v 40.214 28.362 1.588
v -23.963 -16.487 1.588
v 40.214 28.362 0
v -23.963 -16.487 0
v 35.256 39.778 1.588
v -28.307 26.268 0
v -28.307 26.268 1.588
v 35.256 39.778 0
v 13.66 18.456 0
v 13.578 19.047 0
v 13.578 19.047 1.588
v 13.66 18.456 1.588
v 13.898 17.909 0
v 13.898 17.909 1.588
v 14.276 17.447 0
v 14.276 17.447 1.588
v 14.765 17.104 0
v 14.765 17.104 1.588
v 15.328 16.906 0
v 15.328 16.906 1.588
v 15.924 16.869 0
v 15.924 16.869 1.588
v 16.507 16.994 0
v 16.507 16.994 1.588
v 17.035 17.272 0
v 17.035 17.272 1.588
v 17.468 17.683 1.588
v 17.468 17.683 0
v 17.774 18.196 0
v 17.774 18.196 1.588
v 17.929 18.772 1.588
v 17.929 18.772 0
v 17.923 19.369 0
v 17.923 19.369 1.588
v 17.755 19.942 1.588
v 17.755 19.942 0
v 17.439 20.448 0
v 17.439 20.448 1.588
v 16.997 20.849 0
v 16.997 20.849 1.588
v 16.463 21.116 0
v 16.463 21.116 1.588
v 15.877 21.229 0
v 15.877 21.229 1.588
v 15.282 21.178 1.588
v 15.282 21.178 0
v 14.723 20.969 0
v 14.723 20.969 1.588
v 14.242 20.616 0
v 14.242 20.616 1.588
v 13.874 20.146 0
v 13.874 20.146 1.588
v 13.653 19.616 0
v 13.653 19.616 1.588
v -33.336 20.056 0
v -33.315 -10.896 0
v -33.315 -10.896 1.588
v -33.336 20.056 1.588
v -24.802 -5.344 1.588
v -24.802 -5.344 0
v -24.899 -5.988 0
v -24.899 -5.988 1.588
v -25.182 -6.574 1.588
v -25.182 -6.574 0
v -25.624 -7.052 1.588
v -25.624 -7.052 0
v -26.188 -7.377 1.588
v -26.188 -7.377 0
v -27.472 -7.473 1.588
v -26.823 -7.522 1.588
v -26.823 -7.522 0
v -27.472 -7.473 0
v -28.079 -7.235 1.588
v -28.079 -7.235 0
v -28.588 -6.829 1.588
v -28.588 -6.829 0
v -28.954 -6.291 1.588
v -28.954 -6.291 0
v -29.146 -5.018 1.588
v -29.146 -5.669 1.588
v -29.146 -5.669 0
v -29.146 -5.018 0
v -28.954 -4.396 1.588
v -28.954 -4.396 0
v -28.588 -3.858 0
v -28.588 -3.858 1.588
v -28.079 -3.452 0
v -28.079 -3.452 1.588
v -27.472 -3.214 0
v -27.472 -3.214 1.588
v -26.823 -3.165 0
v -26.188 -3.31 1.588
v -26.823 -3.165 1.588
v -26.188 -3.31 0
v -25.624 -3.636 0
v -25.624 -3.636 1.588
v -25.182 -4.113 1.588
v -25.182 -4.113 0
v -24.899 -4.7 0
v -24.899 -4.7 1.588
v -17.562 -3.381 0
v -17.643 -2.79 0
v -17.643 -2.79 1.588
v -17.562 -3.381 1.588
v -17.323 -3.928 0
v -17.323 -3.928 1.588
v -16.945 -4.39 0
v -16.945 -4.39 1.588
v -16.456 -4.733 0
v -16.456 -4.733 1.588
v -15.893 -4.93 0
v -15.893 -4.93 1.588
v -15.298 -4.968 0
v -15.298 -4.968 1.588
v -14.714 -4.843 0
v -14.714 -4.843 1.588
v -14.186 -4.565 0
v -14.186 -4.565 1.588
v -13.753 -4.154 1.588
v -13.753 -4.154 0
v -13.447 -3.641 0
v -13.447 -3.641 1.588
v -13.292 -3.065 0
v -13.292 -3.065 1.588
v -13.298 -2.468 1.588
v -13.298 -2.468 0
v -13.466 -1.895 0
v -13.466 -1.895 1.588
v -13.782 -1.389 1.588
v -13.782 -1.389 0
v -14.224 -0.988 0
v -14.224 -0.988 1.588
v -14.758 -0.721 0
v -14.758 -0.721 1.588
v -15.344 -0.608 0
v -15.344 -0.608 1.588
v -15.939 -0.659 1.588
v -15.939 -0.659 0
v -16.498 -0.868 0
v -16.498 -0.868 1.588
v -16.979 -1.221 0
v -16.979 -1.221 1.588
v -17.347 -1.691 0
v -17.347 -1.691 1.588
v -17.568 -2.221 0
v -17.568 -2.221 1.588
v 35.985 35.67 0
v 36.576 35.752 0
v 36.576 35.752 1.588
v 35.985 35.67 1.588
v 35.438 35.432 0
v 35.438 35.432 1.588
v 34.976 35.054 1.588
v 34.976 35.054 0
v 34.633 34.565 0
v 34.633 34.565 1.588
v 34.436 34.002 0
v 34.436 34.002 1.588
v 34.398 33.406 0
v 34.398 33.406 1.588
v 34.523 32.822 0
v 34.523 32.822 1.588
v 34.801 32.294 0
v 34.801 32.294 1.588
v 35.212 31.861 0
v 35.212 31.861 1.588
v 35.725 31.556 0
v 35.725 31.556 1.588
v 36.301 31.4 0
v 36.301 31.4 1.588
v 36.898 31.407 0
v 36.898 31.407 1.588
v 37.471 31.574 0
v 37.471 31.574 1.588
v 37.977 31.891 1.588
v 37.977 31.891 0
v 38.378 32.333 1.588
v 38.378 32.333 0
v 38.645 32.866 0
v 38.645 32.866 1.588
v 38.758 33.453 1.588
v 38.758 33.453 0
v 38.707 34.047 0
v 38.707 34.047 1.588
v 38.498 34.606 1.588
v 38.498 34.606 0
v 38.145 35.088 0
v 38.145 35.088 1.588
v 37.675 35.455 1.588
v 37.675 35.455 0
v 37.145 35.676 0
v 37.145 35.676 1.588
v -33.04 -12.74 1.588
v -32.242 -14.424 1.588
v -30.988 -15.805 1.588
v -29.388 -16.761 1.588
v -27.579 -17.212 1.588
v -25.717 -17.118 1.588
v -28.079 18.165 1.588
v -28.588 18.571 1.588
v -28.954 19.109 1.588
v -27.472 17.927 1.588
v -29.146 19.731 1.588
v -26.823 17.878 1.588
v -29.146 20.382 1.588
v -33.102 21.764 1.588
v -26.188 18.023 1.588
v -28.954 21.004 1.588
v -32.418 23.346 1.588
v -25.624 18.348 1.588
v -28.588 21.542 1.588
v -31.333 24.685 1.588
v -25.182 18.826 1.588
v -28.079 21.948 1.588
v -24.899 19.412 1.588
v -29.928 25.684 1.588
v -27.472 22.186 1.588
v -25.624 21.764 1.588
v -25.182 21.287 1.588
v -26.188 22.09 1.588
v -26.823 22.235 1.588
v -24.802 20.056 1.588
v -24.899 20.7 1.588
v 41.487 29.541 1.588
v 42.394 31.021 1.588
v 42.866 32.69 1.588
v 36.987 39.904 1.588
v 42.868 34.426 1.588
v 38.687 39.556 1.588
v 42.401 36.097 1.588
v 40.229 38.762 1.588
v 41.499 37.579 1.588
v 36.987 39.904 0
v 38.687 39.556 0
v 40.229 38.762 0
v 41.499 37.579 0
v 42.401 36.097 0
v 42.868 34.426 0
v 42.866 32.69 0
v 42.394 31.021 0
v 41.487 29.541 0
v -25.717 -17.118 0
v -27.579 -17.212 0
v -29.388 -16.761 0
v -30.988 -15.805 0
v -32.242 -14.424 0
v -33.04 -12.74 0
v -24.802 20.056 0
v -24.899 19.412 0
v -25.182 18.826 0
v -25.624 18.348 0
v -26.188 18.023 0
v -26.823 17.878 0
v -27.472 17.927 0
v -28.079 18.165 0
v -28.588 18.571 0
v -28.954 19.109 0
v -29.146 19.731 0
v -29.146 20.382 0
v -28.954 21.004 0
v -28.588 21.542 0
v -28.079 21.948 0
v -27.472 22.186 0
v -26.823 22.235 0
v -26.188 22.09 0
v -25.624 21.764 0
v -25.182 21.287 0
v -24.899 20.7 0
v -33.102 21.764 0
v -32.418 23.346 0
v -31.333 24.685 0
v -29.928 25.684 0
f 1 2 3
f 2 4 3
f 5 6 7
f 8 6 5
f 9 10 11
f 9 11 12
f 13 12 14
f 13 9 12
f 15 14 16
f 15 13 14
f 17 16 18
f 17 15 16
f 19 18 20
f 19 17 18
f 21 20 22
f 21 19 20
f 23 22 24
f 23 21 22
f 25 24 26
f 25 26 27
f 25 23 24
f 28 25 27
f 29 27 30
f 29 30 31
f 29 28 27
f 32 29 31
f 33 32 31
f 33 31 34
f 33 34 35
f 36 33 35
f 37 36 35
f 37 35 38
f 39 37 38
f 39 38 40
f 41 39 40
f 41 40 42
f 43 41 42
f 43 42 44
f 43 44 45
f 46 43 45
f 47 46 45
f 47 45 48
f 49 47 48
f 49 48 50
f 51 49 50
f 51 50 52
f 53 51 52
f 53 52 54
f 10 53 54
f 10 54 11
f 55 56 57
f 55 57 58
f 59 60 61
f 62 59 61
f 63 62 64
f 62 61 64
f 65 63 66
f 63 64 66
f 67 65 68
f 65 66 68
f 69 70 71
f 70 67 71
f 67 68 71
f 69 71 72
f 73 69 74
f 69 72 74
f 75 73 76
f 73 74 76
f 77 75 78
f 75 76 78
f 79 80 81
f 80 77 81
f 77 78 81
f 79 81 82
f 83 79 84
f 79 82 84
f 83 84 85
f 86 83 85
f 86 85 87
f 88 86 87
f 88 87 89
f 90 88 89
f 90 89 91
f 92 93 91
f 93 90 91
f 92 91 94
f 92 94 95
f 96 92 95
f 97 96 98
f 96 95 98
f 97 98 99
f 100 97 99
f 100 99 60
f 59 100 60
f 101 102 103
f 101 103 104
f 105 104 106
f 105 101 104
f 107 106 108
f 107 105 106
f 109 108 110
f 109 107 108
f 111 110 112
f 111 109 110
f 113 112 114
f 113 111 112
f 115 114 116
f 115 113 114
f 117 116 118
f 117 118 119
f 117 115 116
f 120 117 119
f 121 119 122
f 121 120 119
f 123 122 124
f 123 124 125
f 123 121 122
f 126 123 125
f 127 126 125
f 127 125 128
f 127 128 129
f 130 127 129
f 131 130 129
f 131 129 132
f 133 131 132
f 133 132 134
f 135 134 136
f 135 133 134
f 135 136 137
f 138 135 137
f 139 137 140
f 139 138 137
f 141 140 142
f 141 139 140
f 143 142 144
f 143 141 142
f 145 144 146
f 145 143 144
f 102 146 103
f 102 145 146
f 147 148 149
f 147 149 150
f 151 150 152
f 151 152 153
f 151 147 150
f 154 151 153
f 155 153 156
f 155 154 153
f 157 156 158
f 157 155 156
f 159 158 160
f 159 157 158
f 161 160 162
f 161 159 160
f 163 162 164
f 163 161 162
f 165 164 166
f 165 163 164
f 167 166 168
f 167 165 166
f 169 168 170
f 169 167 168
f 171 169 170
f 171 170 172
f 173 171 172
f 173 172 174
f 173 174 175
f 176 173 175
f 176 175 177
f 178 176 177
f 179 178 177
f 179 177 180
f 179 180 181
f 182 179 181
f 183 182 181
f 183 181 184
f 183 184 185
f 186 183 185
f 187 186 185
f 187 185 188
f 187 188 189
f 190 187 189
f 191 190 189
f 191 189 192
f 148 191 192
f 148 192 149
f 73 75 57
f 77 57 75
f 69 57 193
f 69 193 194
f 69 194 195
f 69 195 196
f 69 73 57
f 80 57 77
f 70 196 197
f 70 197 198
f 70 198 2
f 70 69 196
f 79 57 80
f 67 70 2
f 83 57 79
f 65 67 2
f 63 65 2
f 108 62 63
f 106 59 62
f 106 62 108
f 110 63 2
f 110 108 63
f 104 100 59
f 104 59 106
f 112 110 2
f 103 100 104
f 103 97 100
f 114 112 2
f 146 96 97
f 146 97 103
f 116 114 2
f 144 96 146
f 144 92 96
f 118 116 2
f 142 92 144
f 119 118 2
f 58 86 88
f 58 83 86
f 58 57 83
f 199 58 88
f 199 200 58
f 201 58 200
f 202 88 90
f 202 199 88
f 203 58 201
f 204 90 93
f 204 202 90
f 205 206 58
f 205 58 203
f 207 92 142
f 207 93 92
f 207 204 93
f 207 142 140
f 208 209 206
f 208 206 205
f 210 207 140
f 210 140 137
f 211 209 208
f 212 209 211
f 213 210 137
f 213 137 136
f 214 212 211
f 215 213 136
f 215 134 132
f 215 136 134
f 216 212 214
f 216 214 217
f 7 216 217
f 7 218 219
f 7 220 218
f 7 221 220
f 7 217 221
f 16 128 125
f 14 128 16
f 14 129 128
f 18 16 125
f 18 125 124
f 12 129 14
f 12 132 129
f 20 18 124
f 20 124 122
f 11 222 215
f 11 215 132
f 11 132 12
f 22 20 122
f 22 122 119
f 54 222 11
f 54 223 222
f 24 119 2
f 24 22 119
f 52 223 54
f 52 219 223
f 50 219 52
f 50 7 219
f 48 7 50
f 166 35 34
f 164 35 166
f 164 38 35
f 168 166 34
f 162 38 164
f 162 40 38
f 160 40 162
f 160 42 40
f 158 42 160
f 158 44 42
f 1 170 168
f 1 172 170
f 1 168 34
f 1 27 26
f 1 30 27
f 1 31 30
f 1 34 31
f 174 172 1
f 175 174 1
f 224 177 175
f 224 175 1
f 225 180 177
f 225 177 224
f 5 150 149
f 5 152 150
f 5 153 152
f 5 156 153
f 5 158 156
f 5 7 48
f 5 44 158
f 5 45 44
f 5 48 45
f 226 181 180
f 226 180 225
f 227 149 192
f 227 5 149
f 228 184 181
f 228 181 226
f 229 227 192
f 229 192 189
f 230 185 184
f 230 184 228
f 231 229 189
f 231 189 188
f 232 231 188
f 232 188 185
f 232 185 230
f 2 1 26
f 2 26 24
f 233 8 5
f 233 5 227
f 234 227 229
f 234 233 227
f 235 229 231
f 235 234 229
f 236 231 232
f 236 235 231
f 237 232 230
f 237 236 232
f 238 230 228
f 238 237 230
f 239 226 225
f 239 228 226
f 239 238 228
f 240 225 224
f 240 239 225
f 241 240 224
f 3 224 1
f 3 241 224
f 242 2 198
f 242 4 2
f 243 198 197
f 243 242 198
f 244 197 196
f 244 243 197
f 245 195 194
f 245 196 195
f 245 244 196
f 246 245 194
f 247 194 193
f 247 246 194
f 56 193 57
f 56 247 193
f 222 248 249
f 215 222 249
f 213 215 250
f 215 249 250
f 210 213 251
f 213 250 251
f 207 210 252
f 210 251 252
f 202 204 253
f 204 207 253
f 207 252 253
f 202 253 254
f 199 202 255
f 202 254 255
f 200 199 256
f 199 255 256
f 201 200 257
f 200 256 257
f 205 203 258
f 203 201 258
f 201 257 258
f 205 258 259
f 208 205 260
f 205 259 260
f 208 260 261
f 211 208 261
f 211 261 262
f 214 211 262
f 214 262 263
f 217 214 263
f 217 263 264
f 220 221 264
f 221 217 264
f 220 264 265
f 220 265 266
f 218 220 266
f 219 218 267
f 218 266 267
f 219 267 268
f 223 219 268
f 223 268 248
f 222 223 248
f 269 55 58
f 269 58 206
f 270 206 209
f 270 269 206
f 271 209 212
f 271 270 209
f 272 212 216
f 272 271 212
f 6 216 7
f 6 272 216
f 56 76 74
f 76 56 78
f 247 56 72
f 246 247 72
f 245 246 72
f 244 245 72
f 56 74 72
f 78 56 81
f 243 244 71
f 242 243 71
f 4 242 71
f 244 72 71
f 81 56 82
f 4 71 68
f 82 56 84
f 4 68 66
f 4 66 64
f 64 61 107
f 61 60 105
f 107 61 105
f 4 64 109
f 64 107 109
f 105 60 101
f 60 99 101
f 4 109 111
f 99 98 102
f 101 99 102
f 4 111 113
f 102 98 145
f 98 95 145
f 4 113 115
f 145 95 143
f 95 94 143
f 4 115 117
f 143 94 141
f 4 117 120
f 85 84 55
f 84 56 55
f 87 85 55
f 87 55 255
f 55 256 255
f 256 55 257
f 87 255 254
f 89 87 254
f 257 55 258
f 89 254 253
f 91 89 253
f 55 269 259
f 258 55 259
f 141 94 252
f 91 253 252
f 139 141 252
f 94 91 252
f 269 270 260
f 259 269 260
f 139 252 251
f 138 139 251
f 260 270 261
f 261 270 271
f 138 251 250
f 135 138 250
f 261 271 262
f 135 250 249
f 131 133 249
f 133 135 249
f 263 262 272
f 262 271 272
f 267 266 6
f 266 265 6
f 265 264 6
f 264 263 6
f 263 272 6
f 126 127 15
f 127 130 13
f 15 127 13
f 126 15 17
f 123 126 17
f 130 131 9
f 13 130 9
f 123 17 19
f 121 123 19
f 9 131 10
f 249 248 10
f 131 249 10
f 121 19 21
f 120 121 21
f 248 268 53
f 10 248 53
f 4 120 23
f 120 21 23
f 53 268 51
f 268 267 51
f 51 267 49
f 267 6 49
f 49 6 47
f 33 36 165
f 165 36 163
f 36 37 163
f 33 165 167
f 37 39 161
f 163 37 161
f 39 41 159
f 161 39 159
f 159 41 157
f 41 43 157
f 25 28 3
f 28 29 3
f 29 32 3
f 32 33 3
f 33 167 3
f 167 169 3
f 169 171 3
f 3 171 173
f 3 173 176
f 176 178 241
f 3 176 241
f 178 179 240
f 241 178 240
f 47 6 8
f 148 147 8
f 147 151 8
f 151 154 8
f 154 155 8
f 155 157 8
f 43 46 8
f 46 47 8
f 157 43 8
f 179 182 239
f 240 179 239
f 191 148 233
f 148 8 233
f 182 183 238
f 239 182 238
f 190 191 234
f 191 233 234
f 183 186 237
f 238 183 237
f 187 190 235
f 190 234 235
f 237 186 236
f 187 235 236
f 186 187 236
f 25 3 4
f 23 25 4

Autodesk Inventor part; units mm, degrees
ref_plane "YZ Plane" through (0, 0, 0) normal (1, 0, 0) x (0, 1, 0)
ref_plane "XZ Plane" through (0, 0, 0) normal (0, 1, 0) x (-1, 0, 0)
ref_plane "XY Plane" through (0, 0, 0) normal (0, 0, 1) x (1, 0, 0)
sketch "Sketch1" plane through (0, 0, 0) normal (0, 0, 1) x (1, 0, 0)
  ellipse E0 centre (36.5765, 33.5673) end of major axis (38.7609, 33.5673) minor radius 2.1844
  ellipse E1 centre (15.7624, 19.0472) end of major axis (13.578, 19.0472) minor radius 2.1844
  circle A0 centre (-26.9864, 20.0563) radius 2.1844
  ellipse E2 centre (-15.4587, -2.7897) end of major axis (-17.6431, -2.7897) minor radius 2.1844
  circle A1 centre (-26.9864, -5.3437) radius 2.1844
  line L0 (-33.3154, -10.8959) -> (-33.3364, 20.0563)
  arc A2 (-33.3154, -10.8959) -> (-23.9629, -16.4869) centre (-26.9654, -10.8916) ccw
  line L1 (-28.3066, 26.2675) -> (35.2563, 39.7785)
  line L2 (-23.9629, -16.4869) -> (40.2139, 28.3623)
  arc A3 (40.2139, 28.3623) -> (35.2563, 39.7785) centre (36.5765, 33.5673) ccw
  arc A4 (-28.3066, 26.2675) -> (-33.3364, 20.0563) centre (-26.9864, 20.0563) ccw
  point P0 (0, 0)
extrude "Extrusion1" add sketch "Sketch1" along normal blind 1.5875
